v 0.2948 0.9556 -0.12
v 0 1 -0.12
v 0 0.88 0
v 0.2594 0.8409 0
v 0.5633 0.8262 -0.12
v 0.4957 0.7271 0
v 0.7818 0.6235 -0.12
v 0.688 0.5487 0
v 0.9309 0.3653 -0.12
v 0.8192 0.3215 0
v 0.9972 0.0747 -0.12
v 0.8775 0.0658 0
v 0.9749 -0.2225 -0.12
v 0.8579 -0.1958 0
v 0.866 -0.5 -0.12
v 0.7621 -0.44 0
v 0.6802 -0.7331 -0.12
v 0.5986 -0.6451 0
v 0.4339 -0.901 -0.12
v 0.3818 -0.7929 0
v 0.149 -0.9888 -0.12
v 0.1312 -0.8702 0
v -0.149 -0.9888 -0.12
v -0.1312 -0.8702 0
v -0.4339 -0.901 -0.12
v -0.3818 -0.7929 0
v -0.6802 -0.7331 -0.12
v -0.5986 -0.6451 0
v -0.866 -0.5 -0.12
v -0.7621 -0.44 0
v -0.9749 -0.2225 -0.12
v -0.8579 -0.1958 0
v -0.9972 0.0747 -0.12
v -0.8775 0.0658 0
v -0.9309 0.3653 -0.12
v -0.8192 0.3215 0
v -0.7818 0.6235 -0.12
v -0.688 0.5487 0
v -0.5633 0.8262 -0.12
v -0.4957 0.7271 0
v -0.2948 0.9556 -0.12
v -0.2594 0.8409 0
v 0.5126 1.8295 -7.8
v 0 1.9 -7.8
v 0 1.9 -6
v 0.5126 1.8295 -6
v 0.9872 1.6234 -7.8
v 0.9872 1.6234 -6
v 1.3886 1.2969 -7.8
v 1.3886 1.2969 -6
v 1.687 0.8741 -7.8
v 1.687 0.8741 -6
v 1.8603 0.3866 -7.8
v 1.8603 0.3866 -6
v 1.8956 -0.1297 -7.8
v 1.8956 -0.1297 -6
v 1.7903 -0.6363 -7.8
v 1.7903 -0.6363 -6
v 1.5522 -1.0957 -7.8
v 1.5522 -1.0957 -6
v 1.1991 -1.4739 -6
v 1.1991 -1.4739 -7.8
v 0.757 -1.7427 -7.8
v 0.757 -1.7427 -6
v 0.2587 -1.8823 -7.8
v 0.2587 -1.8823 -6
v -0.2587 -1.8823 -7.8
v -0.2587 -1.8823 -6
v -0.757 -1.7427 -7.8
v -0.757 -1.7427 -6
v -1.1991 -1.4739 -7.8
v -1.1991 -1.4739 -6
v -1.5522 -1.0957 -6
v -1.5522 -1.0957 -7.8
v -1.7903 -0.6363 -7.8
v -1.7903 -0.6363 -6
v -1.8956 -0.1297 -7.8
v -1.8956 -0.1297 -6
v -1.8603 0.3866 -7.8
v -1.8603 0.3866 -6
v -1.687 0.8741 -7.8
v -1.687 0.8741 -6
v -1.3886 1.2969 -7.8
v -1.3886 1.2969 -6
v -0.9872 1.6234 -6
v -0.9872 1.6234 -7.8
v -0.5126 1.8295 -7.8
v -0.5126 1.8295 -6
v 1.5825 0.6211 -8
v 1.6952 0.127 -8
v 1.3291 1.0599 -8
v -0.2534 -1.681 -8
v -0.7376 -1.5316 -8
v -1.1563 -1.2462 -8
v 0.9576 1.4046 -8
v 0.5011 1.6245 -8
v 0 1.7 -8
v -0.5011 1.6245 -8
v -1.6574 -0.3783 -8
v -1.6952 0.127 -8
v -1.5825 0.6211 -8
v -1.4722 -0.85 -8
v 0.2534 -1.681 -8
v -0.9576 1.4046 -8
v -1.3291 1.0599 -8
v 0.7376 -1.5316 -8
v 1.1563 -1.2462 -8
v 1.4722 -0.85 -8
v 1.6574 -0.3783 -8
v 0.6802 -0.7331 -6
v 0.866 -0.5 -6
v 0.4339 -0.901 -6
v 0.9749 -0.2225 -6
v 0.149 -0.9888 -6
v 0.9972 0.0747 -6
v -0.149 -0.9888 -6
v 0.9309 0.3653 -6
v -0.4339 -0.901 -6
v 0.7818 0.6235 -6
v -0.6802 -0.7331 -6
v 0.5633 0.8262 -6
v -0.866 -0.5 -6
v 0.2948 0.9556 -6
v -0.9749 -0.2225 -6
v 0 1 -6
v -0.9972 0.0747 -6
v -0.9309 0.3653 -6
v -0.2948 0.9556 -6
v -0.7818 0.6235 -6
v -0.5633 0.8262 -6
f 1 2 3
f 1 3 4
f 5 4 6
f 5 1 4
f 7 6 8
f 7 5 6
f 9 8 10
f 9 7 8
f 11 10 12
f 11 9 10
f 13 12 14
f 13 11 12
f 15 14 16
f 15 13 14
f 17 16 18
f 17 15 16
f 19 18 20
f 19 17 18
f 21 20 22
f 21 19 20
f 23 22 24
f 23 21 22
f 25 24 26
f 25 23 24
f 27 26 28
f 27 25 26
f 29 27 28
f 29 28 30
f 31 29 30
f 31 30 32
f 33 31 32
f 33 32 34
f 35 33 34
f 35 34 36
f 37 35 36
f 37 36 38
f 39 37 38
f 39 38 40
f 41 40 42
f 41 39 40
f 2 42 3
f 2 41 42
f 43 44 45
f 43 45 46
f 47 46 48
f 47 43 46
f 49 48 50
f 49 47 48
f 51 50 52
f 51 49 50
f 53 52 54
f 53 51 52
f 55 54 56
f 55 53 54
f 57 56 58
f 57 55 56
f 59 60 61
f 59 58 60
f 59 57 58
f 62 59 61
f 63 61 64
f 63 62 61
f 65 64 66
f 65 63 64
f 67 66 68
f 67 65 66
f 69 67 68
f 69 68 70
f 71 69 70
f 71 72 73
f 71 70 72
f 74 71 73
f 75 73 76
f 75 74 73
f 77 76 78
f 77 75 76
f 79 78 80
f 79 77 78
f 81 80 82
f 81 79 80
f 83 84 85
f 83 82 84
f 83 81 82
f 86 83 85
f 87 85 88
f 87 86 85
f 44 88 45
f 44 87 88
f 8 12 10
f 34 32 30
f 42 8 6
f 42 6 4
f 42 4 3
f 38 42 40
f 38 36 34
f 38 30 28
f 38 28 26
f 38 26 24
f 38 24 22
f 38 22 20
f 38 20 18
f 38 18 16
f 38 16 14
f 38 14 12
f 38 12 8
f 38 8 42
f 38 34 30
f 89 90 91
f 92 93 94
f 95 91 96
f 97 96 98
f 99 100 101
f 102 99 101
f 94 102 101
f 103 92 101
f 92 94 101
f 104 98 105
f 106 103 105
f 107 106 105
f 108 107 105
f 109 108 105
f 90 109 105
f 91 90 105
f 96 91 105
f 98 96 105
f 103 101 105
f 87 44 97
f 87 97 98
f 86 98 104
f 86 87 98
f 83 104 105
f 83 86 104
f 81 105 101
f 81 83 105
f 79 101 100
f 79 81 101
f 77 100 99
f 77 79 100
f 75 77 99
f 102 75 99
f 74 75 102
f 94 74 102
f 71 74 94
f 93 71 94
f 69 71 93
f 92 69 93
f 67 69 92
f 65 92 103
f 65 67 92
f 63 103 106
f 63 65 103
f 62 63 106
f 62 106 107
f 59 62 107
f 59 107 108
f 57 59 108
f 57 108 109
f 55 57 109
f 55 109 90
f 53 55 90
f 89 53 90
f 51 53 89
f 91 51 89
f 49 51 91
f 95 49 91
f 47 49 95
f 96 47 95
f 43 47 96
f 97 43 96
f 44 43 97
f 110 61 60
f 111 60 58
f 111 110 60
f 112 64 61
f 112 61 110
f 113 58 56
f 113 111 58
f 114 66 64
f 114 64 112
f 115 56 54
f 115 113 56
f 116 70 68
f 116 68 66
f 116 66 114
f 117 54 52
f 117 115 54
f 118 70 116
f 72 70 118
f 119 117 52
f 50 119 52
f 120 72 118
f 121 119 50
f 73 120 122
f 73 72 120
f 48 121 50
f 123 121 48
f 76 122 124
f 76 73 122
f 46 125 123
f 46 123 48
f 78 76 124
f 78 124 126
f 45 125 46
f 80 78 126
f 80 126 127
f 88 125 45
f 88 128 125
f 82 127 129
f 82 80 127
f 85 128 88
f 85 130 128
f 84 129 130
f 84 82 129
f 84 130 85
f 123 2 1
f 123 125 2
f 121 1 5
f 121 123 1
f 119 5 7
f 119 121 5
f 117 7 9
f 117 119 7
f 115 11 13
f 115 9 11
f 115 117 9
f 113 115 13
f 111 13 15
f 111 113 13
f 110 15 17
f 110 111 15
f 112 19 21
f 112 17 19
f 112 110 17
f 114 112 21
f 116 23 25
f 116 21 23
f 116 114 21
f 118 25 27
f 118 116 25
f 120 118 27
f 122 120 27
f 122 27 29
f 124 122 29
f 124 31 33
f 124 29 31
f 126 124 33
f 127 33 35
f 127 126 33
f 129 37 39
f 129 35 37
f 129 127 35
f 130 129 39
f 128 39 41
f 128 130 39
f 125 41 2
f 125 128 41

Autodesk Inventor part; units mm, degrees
ref_plane "YZ Plane" through (0, 0, 0) normal (1, 0, 0) x (0, 1, 0)
ref_plane "XZ Plane" through (0, 0, 0) normal (0, 1, 0) x (-1, 0, 0)
ref_plane "XY Plane" through (0, 0, 0) normal (0, 0, 1) x (1, 0, 0)
sketch "スケッチ1" plane through (0, 0, 0) normal (1, 0, 0) x (0, 1, 0)
  line L0 (0, 0) -> (1, 0)
  line L1 (1, 0) -> (1, -6)
  line L2 (1, -6) -> (0, -6)
  line L3 (0, -6) -> (0, 0)
  line L4 (0, -6) -> (1.9, -6)
  line L5 (1.9, -6) -> (1.9, -8)
  line L6 (1.9, -8) -> (0, -8)
  line L7 (0, -8) -> (0, -6)
  line L8 (1.9, -7.8) -> (1.7, -8)
  line L9 (1, -0.12) -> (0.88, 0)
  point P0 (1.9, -7)
  point P1 (1, -6)
  dimension "d0" = 45
  dimension "d1" = 1.9
  dimension "d2" = 2
  dimension "d3" = 6
  dimension "d7" = 1
  dimension "d10" = 45
  dimension "d11" = 0.2
  dimension "d12" = 0.12
revolve "回転1" add sketch "スケッチ1" angle 360 about axis through (0, 0, -6) along (0, 0, 1) contours L0 L9 L1 L2 L3 | L2 L4 L5 L8 L6 L7
thread "ねじ2" size "M2x0.4" class "6g" standard "ANSI Metric M Profile" length 30
properties part number "CSH-316L-M2-6" material "ステンレス鋼"
